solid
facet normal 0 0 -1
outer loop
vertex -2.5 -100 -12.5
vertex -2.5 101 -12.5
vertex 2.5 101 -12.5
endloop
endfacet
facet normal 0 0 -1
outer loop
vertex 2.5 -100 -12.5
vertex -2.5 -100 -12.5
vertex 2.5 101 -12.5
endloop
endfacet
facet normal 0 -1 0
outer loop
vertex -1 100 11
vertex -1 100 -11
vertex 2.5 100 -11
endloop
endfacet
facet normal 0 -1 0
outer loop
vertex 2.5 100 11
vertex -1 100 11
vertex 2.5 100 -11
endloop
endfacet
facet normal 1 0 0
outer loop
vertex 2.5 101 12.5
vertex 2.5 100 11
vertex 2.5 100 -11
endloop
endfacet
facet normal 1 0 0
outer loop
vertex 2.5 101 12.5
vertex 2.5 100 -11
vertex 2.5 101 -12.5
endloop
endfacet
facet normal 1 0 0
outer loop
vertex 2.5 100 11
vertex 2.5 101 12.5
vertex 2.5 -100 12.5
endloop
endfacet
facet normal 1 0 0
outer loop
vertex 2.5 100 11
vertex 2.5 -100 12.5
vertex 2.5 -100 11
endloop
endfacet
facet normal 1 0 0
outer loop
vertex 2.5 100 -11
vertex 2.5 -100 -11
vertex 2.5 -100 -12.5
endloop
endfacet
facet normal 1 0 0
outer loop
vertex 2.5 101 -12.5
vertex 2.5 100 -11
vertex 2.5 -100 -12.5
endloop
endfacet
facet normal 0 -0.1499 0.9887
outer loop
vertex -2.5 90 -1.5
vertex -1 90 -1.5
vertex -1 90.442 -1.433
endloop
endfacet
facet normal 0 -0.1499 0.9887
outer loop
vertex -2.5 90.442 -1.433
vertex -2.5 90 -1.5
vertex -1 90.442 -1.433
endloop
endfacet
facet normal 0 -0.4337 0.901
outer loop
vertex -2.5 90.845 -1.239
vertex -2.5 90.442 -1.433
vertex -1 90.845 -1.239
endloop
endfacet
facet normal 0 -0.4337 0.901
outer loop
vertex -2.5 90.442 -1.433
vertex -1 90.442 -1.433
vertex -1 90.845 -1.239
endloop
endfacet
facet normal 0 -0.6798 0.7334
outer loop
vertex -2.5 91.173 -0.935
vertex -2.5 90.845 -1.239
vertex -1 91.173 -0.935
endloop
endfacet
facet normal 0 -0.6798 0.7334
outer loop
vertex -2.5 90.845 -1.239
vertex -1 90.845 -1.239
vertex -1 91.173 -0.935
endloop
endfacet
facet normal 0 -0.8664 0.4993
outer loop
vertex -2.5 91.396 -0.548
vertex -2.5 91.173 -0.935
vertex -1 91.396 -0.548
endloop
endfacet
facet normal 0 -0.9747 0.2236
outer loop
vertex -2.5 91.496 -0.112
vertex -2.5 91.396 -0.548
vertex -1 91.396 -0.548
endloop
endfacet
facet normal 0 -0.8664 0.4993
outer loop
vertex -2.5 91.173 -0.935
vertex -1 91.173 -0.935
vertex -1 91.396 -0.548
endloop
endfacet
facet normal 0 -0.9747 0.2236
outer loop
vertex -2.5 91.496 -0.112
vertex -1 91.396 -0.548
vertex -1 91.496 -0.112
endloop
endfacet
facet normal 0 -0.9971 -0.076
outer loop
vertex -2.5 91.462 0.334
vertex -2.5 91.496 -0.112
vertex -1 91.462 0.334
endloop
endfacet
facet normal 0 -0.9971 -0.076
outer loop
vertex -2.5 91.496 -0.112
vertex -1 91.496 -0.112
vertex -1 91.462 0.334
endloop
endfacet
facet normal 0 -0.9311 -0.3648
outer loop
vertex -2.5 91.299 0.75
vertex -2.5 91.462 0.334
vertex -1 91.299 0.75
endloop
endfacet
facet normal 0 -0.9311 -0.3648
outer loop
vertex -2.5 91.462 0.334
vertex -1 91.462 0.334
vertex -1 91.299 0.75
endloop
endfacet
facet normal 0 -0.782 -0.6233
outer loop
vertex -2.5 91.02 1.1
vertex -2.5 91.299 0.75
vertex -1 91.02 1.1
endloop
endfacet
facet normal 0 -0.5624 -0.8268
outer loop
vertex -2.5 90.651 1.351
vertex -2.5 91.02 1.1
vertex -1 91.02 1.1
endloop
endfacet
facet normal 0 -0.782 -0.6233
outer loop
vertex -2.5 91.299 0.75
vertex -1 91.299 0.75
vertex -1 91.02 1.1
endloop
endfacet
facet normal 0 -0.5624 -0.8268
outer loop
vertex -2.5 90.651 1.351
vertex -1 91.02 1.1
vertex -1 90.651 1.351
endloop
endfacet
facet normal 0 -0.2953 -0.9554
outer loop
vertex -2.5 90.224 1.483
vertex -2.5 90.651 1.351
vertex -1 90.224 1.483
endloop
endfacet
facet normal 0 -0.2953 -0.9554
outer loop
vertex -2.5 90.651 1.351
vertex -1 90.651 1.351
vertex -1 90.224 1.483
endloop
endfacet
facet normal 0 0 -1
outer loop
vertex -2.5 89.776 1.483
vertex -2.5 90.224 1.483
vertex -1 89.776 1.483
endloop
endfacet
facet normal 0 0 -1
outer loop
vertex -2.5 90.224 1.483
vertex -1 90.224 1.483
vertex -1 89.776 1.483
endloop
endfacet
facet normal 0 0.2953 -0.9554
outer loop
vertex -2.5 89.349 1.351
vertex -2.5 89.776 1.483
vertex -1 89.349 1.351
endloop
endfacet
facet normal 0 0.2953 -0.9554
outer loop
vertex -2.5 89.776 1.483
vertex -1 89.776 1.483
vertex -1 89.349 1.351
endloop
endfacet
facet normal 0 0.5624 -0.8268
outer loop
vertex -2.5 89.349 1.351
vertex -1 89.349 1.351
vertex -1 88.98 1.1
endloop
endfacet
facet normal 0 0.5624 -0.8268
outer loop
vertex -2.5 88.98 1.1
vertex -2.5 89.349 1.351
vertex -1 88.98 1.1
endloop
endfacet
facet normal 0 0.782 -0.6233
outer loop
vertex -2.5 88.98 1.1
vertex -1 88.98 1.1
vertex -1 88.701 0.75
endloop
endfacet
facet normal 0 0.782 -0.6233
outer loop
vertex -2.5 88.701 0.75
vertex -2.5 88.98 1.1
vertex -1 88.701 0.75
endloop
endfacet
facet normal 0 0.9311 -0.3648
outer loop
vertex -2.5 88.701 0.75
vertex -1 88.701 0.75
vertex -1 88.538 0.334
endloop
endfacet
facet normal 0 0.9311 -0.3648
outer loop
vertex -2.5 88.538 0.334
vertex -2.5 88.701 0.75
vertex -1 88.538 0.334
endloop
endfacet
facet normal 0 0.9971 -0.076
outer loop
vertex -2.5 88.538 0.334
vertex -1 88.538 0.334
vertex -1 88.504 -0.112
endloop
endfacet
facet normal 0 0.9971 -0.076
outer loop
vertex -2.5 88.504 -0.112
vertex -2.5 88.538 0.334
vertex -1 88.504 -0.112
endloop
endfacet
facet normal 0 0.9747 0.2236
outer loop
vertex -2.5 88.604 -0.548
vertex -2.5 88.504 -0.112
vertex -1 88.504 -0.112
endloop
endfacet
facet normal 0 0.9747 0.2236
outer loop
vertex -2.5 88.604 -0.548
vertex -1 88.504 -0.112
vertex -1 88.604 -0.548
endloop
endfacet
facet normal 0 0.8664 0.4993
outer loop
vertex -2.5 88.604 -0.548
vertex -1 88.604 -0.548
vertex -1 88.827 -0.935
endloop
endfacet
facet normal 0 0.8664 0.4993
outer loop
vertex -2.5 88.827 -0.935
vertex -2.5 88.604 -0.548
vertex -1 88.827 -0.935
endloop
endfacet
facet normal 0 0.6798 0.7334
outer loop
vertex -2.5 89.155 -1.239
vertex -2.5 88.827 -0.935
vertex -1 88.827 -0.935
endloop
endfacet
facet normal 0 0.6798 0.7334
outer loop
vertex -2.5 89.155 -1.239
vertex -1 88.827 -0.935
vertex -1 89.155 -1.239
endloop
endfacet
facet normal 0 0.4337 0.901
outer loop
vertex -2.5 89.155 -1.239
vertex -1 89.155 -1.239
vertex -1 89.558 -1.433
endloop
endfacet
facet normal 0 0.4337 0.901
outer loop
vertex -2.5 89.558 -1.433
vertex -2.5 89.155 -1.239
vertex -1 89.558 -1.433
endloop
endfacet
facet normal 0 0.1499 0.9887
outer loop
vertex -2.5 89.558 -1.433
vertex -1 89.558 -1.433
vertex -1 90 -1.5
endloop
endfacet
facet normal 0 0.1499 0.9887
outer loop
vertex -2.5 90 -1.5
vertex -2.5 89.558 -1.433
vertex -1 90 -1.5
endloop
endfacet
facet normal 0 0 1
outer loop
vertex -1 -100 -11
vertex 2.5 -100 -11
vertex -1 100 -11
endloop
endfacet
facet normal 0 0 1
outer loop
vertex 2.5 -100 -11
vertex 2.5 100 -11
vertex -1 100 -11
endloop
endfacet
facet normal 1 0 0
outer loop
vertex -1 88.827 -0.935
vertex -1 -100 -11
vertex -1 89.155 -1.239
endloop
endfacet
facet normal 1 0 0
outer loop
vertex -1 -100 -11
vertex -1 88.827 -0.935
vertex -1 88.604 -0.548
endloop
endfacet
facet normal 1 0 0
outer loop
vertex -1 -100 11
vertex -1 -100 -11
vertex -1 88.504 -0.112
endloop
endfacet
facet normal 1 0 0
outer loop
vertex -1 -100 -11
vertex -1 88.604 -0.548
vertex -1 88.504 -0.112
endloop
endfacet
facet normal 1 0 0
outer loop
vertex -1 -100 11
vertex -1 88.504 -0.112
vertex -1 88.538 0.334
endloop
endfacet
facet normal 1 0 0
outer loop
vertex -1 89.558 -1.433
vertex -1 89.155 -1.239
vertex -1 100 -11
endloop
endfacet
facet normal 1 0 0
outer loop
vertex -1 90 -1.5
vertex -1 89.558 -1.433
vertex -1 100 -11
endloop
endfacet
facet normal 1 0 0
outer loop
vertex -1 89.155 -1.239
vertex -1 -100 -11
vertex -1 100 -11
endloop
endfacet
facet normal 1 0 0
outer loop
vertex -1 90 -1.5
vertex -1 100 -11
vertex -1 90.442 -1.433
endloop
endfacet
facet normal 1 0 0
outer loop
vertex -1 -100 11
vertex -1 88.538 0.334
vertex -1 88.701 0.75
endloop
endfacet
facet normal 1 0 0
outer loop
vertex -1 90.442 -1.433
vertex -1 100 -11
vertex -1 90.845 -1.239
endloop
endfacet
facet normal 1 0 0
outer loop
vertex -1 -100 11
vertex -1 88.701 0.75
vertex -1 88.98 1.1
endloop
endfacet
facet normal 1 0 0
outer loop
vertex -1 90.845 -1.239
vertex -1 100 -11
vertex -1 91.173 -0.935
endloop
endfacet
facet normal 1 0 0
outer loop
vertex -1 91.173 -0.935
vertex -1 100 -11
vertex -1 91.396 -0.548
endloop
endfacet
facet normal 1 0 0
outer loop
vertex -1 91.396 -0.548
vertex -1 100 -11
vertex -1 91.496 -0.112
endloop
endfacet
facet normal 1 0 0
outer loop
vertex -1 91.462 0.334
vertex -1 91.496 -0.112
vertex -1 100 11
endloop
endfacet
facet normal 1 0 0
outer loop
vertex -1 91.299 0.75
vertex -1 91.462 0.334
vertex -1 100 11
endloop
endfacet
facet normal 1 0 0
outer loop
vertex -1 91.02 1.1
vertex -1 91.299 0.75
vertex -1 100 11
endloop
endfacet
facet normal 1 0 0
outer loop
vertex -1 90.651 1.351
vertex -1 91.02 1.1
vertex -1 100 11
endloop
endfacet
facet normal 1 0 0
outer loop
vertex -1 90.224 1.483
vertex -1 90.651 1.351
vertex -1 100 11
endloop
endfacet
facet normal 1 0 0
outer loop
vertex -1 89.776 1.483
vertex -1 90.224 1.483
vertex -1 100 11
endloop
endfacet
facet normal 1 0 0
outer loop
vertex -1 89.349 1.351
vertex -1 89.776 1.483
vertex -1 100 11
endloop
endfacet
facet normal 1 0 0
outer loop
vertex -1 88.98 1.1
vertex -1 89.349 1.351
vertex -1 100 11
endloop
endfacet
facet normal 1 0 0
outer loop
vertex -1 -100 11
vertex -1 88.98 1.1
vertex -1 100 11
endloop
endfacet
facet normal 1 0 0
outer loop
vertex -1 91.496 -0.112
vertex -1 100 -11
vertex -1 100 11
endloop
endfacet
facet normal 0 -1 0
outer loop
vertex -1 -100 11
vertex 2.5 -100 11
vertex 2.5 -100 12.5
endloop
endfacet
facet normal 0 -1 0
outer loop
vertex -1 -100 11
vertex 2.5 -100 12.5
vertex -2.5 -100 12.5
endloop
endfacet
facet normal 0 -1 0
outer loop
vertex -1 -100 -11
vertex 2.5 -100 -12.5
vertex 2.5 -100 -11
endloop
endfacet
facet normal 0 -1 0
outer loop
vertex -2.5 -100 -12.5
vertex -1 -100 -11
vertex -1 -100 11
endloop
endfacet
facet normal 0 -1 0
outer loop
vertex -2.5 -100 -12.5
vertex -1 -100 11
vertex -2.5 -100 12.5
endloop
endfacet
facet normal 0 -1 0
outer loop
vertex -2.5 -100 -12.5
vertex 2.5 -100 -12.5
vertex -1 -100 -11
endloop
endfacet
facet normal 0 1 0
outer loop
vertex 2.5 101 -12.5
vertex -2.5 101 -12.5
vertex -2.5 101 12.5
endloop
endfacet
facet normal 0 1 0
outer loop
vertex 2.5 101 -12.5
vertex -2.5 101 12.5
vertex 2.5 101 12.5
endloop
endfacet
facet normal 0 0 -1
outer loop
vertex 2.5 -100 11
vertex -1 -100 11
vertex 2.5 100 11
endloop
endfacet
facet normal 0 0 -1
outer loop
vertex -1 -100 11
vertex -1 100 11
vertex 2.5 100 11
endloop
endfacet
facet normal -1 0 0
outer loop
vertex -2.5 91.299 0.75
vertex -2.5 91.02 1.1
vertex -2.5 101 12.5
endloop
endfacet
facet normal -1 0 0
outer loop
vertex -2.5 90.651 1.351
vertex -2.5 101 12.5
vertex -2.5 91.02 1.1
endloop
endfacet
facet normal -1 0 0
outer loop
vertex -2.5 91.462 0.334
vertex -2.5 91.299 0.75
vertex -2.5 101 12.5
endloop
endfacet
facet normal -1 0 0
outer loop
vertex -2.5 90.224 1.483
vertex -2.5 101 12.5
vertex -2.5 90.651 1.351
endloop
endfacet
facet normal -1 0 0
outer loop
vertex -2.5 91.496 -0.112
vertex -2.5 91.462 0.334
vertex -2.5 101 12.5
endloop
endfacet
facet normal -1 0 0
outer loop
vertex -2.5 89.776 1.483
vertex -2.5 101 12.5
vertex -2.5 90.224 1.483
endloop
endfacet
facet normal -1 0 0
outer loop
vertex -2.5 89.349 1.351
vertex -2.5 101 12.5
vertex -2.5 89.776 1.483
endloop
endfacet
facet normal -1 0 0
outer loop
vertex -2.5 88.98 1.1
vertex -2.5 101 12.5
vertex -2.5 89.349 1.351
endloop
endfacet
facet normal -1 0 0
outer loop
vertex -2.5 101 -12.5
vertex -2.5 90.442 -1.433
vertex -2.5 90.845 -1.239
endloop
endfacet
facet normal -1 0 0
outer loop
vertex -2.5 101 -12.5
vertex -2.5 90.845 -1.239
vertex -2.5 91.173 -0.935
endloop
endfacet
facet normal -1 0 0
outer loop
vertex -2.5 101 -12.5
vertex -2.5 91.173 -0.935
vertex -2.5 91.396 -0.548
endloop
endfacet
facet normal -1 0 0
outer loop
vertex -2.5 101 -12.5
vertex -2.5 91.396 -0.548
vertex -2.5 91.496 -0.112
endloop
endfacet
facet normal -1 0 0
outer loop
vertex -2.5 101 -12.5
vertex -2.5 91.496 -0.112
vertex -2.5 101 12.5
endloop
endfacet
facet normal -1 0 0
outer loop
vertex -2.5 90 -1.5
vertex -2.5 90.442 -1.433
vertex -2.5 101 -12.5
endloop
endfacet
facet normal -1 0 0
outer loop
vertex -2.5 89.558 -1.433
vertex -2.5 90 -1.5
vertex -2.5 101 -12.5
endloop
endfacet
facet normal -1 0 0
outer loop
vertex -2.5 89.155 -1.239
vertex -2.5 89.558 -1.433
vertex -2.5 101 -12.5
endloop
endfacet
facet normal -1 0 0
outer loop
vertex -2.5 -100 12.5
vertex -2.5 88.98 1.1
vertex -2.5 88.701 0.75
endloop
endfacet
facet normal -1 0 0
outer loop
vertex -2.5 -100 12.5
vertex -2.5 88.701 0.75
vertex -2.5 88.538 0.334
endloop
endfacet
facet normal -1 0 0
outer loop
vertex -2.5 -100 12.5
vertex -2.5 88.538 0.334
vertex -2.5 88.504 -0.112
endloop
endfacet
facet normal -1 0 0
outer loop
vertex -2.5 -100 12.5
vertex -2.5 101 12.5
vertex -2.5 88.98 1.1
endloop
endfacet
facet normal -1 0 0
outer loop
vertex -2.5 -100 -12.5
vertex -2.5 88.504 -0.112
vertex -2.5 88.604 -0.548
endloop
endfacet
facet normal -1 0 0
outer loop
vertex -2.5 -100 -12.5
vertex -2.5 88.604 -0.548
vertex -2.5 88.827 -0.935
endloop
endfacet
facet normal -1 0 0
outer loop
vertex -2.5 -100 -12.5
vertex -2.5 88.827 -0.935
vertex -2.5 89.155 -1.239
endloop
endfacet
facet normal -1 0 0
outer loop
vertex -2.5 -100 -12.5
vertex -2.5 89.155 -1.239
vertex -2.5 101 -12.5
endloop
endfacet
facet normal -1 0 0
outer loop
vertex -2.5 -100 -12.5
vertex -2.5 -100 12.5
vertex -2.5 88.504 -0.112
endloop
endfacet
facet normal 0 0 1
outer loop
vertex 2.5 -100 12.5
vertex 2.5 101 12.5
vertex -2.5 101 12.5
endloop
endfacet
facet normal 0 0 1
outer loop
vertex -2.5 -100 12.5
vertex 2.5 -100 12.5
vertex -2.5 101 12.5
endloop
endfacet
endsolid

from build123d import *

# Parameters (mm, degrees)
BOSS_EXTRUDE1_DEPTH = 100
BOSS_EXTRUDE2_START = 100
SKETCH1_3_W         = 3.5
SKETCH1_3_H         = 22
BOSS_EXTRUDE2_DEPTH = 1
SKETCH2_R           = 1.5
CUT_EXTRUDE1_DEPTH  = 25


with BuildPart() as part:
    # Sketch1 → Boss-Extrude1 (new, symmetric)
    with BuildSketch(Plane(origin=(0, 0, 0), x_dir=(1, 0, 0), z_dir=(0, 1, 0))):
        Polygon((-2.5, -12.5), (-2.5, 12.5), (2.5, 12.5), (2.5, 11), (-1, 11), (-1, -11), (2.5, -11), (2.5, -12.5), align=None)
    extrude(amount=BOSS_EXTRUDE1_DEPTH, both=True)

    # Sketch1<3> → Boss-Extrude2 (add)
    with BuildSketch(Plane(origin=(0, 0, 0), x_dir=(1, 0, 0), z_dir=(0, 1, 0)).offset(BOSS_EXTRUDE2_START)):
        with Locations((0.75, 0)):
            Rectangle(SKETCH1_3_W, SKETCH1_3_H)
        Polygon((2.5, 11), (-1, 11), (-1, -11), (2.5, -11), (2.5, -12.5), (-2.5, -12.5), (-2.5, 12.5), (2.5, 12.5), align=None)
    extrude(amount=BOSS_EXTRUDE2_DEPTH)

    # Sketch2 → Cut-Extrude1 (cut)
    with BuildSketch(Plane(origin=(-1, 0, 0), x_dir=(0, 0, -1), z_dir=(1, 0, 0))):
        with Locations((0, 90)):
            Circle(SKETCH2_R)
    extrude(amount=-CUT_EXTRUDE1_DEPTH, mode=Mode.SUBTRACT)


solid = part.part
